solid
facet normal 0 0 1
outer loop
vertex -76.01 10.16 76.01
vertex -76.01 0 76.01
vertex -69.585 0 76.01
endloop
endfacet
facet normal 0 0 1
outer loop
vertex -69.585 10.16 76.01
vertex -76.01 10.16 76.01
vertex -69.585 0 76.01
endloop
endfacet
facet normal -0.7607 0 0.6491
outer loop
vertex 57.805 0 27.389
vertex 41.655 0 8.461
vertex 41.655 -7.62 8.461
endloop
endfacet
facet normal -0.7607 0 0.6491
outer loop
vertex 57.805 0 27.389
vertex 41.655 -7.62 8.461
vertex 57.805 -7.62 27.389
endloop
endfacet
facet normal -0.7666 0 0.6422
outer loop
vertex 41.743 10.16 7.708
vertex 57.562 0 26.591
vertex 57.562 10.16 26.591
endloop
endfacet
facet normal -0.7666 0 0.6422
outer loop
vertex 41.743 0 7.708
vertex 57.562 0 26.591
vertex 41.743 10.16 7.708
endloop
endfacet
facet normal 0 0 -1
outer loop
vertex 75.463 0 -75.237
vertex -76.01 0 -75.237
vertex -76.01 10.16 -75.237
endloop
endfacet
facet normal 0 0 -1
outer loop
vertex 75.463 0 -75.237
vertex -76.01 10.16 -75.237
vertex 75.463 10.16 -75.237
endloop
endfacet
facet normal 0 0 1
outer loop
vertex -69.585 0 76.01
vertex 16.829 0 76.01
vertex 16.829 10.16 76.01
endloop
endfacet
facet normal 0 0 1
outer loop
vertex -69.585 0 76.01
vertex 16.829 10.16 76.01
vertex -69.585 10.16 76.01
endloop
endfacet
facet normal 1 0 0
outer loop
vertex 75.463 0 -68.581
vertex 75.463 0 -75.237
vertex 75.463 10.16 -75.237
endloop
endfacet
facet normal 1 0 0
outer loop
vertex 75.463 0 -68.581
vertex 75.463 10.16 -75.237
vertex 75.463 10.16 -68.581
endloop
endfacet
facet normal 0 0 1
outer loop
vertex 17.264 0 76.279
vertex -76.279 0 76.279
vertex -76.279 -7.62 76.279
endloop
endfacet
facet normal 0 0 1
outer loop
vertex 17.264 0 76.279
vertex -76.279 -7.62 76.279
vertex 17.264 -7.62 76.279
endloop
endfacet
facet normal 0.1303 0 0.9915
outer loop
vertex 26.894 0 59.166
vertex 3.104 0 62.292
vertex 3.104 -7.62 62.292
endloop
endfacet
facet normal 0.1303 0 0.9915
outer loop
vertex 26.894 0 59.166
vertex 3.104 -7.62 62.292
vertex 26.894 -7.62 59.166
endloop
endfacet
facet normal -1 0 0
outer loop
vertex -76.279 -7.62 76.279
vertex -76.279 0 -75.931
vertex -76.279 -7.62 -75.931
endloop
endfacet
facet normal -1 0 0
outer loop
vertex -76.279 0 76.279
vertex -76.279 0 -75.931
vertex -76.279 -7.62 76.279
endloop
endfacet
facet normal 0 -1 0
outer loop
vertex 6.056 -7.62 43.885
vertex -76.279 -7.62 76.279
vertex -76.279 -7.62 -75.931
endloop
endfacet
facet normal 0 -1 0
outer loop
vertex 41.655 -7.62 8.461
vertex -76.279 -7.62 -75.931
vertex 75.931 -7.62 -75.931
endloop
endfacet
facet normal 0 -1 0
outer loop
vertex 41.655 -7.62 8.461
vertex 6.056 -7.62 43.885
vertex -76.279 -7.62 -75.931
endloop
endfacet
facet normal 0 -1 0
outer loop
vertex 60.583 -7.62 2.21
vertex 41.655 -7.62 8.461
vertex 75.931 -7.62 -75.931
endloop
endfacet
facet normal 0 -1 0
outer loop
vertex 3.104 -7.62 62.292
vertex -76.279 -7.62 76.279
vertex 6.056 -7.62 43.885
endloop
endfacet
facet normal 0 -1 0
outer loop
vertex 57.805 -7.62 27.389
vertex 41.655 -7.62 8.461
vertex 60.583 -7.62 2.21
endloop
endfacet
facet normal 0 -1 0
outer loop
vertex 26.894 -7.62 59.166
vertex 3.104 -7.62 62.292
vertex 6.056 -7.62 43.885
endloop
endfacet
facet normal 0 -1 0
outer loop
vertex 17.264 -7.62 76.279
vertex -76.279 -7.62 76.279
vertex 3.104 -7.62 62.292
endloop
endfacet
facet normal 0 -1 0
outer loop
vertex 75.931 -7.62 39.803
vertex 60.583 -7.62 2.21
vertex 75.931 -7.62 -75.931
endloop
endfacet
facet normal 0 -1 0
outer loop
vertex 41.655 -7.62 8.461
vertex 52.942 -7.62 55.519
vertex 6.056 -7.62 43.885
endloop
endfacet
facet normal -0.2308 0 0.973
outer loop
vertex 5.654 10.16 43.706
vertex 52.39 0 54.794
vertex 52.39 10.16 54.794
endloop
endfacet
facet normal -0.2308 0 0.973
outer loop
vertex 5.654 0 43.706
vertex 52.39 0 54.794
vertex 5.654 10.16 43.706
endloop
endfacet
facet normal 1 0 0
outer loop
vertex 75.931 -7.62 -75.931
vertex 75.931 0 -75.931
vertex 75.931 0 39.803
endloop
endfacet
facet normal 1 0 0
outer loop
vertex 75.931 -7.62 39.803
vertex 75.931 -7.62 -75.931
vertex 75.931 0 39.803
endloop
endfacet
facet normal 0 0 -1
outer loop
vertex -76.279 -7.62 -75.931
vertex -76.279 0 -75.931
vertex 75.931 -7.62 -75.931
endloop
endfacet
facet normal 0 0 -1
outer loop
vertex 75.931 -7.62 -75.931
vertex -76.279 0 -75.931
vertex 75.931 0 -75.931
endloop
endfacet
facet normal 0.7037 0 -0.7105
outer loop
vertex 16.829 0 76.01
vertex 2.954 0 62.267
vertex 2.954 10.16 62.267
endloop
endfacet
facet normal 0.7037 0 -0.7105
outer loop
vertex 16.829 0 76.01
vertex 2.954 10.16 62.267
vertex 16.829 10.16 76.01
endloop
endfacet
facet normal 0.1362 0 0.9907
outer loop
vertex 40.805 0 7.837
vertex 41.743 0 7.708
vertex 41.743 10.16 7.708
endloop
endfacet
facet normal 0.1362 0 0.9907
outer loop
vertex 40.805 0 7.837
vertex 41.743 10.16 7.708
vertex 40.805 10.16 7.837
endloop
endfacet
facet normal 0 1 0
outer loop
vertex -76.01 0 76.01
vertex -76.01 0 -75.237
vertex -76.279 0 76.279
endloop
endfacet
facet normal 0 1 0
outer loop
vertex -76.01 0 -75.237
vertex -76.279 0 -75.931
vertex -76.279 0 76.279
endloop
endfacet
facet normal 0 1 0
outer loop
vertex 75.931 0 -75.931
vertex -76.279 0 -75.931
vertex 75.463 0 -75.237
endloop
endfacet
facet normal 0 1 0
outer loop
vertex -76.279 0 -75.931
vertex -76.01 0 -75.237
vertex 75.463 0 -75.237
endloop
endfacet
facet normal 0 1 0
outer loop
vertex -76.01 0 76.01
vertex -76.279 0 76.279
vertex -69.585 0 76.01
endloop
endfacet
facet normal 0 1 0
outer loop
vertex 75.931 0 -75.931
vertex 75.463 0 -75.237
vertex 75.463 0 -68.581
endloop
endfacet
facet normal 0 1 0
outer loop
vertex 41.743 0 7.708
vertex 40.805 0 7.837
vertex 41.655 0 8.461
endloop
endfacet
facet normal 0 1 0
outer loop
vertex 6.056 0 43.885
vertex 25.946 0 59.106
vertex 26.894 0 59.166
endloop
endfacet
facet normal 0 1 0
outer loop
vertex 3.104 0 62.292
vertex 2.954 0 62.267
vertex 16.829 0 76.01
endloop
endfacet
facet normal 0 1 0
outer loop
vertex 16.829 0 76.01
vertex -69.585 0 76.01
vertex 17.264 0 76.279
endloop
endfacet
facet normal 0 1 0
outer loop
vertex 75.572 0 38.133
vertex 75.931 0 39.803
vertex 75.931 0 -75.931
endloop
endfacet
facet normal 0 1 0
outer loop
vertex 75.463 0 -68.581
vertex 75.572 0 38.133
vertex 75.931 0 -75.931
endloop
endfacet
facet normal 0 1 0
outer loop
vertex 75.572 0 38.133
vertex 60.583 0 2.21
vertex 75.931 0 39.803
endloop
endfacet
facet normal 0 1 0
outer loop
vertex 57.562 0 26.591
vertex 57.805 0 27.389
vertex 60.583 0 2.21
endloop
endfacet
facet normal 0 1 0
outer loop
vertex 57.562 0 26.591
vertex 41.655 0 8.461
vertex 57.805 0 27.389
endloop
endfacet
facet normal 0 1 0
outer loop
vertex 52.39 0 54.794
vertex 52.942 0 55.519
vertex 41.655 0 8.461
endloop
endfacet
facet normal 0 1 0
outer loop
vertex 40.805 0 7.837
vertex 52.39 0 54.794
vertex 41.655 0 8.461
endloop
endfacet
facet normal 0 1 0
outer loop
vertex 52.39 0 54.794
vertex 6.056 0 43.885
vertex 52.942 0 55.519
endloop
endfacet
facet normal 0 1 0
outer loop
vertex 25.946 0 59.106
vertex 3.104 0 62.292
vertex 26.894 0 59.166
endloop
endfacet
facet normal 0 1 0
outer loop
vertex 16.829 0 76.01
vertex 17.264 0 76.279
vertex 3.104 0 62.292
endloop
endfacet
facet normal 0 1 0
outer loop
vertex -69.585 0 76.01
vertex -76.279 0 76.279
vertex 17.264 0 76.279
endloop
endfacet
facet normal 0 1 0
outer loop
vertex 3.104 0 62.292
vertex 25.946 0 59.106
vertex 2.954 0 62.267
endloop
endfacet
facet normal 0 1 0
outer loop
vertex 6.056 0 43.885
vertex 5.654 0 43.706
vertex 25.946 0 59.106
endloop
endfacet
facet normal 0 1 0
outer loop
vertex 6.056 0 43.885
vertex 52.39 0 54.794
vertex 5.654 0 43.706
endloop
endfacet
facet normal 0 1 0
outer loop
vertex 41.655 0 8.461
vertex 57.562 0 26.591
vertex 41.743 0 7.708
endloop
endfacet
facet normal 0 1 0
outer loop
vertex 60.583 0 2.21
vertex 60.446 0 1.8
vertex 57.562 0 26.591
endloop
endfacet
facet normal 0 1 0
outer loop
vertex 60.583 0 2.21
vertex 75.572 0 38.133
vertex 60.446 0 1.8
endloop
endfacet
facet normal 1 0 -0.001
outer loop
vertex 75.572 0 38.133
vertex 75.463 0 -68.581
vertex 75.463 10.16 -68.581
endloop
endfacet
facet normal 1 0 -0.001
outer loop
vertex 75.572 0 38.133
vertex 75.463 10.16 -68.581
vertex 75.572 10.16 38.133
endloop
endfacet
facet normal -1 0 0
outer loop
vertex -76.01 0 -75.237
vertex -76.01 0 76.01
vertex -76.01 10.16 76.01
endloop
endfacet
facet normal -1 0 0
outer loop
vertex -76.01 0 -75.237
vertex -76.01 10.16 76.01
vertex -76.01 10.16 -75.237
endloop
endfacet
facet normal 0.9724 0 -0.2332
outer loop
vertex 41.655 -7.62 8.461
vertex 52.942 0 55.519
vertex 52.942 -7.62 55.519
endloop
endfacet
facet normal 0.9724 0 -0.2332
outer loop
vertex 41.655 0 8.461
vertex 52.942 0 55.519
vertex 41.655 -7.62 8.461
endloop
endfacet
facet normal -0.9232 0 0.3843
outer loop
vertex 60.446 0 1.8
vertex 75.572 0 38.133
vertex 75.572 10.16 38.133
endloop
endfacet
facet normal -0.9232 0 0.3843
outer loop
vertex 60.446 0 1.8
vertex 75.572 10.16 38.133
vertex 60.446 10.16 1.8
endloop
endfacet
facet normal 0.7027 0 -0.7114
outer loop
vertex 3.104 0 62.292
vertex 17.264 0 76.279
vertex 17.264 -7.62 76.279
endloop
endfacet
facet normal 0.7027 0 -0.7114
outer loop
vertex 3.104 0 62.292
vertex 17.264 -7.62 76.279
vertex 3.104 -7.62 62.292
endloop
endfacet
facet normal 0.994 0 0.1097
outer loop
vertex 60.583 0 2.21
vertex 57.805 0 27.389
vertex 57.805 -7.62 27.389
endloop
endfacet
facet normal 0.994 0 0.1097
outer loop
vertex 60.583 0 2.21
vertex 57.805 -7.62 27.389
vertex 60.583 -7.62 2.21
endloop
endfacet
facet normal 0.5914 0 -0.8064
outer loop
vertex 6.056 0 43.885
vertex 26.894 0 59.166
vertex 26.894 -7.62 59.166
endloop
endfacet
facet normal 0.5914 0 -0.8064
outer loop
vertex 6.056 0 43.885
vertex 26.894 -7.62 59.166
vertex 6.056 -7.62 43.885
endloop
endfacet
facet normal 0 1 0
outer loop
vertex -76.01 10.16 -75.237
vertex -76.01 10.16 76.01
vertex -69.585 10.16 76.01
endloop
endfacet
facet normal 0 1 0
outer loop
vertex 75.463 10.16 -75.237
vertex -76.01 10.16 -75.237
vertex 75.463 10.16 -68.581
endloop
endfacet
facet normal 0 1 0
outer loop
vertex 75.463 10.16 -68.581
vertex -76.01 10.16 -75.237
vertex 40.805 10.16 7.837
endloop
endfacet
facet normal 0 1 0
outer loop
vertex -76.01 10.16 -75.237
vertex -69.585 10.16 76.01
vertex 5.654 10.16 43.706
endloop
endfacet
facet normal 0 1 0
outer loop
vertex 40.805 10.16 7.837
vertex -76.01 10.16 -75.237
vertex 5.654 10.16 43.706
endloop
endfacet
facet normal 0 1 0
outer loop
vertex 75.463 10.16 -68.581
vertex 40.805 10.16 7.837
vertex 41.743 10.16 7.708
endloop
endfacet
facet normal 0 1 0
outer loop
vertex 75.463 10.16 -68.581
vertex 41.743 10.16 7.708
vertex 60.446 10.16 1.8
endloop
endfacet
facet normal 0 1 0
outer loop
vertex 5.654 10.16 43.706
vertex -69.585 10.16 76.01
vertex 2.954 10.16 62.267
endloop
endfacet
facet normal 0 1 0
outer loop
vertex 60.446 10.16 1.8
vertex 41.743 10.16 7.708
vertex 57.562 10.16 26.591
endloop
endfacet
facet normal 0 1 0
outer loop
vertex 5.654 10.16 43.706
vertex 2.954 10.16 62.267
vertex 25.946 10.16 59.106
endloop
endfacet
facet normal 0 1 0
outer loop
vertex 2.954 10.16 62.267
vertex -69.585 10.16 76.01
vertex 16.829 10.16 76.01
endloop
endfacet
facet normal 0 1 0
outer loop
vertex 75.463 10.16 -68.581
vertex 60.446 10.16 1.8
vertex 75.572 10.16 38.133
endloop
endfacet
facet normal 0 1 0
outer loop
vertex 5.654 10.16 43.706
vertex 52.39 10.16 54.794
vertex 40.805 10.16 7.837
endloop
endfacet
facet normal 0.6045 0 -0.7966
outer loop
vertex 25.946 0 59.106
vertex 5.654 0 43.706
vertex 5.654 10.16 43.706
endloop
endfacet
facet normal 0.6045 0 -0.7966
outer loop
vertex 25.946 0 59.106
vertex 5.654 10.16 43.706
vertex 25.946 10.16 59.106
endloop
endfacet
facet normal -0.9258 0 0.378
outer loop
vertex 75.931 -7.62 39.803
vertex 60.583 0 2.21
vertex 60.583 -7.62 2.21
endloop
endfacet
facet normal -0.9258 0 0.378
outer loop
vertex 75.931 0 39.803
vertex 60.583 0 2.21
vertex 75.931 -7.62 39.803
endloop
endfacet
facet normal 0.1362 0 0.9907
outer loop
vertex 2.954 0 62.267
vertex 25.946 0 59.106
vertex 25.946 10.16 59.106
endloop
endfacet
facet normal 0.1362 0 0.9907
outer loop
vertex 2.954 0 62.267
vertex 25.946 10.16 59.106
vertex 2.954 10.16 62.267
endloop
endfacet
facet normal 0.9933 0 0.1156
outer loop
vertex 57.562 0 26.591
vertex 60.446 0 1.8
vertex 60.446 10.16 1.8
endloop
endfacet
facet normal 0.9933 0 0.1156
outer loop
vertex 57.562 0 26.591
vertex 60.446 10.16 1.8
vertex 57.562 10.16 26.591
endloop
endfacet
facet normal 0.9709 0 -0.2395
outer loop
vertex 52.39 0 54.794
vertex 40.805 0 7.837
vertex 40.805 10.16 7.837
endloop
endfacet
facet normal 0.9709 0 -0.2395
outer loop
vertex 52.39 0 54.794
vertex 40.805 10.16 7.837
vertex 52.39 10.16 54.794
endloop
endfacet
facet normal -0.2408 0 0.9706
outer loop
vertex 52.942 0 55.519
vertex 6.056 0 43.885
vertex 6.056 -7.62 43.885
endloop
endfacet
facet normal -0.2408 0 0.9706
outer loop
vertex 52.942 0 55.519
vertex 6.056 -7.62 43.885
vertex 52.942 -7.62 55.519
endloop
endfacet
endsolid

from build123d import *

# Parameters (mm, degrees)
F0_W     = 152.209915
F0_H     = 152.209915
F1_DEPTH = 7.62
F3_DEPTH = 7.62
F4_W     = 6.424934
F4_H     = 7.163491
F4_H_2   = 137.427088
F4_W_2   = 139.438458
F4_H_3   = 6.655872
F4_W_3   = 5.60908
F5_DEPTH = 10.16


with BuildPart() as f1:
    # F0 (on Front) → F1 (new body)
    with BuildSketch(Plane.XZ):
        with Locations((-0.173558, 0.173558)):
            Rectangle(F0_W, F0_H)
    extrude(amount=F1_DEPTH)

    # F2 (on Front) → F3 (cut)
    with BuildSketch(Plane.XZ):
        Polygon((60.583096, 2.209843), (76.038271, 40.064868), (76.211937, 76.357067), (17.343326, 76.357067), (3.103723, 62.291671), (26.894279, 59.166025), (6.055835, 43.885101), (52.942332, 55.519439), (41.654844, 8.461132), (57.804637, 27.388643), align=None)
    extrude(amount=F3_DEPTH, mode=Mode.SUBTRACT)

    # F4 (on Front) → F5 (join)
    with BuildSketch(Plane.XZ):
        with Locations((-72.797306, 72.428027)):
            Rectangle(F4_W, F4_H)
        Polygon((9.771794, 76.009773), (-69.584839, 76.009773), (-69.584839, 68.846282), (-69.584839, -68.580806), (69.853619, -68.580806), (75.462699, -68.580806), (75.572275, 38.133189), (60.446158, 1.799743), (57.562228, 26.590804), (41.742637, 7.708041), (40.805306, 7.83694), (52.3897, 54.794144), (5.653567, 43.706257), (25.945945, 59.105508), (2.954097, 62.26727), (16.829018, 76.009773), align=None)
        with Locations((-72.797306, 0.132738)):
            Rectangle(F4_W, F4_H_2)
        Polygon((-69.584839, -68.580806), (-76.009773, -68.580806), (-76.009773, -68.638086), (-76.009773, -75.236678), (-69.584839, -75.236678), align=None)
        with Locations((0.13439, -71.908742)):
            Rectangle(F4_W_2, F4_H_3)
        with Locations((72.658159, -71.908742)):
            Rectangle(F4_W_3, F4_H_3)
    extrude(amount=-F5_DEPTH)


solid = f1.part
